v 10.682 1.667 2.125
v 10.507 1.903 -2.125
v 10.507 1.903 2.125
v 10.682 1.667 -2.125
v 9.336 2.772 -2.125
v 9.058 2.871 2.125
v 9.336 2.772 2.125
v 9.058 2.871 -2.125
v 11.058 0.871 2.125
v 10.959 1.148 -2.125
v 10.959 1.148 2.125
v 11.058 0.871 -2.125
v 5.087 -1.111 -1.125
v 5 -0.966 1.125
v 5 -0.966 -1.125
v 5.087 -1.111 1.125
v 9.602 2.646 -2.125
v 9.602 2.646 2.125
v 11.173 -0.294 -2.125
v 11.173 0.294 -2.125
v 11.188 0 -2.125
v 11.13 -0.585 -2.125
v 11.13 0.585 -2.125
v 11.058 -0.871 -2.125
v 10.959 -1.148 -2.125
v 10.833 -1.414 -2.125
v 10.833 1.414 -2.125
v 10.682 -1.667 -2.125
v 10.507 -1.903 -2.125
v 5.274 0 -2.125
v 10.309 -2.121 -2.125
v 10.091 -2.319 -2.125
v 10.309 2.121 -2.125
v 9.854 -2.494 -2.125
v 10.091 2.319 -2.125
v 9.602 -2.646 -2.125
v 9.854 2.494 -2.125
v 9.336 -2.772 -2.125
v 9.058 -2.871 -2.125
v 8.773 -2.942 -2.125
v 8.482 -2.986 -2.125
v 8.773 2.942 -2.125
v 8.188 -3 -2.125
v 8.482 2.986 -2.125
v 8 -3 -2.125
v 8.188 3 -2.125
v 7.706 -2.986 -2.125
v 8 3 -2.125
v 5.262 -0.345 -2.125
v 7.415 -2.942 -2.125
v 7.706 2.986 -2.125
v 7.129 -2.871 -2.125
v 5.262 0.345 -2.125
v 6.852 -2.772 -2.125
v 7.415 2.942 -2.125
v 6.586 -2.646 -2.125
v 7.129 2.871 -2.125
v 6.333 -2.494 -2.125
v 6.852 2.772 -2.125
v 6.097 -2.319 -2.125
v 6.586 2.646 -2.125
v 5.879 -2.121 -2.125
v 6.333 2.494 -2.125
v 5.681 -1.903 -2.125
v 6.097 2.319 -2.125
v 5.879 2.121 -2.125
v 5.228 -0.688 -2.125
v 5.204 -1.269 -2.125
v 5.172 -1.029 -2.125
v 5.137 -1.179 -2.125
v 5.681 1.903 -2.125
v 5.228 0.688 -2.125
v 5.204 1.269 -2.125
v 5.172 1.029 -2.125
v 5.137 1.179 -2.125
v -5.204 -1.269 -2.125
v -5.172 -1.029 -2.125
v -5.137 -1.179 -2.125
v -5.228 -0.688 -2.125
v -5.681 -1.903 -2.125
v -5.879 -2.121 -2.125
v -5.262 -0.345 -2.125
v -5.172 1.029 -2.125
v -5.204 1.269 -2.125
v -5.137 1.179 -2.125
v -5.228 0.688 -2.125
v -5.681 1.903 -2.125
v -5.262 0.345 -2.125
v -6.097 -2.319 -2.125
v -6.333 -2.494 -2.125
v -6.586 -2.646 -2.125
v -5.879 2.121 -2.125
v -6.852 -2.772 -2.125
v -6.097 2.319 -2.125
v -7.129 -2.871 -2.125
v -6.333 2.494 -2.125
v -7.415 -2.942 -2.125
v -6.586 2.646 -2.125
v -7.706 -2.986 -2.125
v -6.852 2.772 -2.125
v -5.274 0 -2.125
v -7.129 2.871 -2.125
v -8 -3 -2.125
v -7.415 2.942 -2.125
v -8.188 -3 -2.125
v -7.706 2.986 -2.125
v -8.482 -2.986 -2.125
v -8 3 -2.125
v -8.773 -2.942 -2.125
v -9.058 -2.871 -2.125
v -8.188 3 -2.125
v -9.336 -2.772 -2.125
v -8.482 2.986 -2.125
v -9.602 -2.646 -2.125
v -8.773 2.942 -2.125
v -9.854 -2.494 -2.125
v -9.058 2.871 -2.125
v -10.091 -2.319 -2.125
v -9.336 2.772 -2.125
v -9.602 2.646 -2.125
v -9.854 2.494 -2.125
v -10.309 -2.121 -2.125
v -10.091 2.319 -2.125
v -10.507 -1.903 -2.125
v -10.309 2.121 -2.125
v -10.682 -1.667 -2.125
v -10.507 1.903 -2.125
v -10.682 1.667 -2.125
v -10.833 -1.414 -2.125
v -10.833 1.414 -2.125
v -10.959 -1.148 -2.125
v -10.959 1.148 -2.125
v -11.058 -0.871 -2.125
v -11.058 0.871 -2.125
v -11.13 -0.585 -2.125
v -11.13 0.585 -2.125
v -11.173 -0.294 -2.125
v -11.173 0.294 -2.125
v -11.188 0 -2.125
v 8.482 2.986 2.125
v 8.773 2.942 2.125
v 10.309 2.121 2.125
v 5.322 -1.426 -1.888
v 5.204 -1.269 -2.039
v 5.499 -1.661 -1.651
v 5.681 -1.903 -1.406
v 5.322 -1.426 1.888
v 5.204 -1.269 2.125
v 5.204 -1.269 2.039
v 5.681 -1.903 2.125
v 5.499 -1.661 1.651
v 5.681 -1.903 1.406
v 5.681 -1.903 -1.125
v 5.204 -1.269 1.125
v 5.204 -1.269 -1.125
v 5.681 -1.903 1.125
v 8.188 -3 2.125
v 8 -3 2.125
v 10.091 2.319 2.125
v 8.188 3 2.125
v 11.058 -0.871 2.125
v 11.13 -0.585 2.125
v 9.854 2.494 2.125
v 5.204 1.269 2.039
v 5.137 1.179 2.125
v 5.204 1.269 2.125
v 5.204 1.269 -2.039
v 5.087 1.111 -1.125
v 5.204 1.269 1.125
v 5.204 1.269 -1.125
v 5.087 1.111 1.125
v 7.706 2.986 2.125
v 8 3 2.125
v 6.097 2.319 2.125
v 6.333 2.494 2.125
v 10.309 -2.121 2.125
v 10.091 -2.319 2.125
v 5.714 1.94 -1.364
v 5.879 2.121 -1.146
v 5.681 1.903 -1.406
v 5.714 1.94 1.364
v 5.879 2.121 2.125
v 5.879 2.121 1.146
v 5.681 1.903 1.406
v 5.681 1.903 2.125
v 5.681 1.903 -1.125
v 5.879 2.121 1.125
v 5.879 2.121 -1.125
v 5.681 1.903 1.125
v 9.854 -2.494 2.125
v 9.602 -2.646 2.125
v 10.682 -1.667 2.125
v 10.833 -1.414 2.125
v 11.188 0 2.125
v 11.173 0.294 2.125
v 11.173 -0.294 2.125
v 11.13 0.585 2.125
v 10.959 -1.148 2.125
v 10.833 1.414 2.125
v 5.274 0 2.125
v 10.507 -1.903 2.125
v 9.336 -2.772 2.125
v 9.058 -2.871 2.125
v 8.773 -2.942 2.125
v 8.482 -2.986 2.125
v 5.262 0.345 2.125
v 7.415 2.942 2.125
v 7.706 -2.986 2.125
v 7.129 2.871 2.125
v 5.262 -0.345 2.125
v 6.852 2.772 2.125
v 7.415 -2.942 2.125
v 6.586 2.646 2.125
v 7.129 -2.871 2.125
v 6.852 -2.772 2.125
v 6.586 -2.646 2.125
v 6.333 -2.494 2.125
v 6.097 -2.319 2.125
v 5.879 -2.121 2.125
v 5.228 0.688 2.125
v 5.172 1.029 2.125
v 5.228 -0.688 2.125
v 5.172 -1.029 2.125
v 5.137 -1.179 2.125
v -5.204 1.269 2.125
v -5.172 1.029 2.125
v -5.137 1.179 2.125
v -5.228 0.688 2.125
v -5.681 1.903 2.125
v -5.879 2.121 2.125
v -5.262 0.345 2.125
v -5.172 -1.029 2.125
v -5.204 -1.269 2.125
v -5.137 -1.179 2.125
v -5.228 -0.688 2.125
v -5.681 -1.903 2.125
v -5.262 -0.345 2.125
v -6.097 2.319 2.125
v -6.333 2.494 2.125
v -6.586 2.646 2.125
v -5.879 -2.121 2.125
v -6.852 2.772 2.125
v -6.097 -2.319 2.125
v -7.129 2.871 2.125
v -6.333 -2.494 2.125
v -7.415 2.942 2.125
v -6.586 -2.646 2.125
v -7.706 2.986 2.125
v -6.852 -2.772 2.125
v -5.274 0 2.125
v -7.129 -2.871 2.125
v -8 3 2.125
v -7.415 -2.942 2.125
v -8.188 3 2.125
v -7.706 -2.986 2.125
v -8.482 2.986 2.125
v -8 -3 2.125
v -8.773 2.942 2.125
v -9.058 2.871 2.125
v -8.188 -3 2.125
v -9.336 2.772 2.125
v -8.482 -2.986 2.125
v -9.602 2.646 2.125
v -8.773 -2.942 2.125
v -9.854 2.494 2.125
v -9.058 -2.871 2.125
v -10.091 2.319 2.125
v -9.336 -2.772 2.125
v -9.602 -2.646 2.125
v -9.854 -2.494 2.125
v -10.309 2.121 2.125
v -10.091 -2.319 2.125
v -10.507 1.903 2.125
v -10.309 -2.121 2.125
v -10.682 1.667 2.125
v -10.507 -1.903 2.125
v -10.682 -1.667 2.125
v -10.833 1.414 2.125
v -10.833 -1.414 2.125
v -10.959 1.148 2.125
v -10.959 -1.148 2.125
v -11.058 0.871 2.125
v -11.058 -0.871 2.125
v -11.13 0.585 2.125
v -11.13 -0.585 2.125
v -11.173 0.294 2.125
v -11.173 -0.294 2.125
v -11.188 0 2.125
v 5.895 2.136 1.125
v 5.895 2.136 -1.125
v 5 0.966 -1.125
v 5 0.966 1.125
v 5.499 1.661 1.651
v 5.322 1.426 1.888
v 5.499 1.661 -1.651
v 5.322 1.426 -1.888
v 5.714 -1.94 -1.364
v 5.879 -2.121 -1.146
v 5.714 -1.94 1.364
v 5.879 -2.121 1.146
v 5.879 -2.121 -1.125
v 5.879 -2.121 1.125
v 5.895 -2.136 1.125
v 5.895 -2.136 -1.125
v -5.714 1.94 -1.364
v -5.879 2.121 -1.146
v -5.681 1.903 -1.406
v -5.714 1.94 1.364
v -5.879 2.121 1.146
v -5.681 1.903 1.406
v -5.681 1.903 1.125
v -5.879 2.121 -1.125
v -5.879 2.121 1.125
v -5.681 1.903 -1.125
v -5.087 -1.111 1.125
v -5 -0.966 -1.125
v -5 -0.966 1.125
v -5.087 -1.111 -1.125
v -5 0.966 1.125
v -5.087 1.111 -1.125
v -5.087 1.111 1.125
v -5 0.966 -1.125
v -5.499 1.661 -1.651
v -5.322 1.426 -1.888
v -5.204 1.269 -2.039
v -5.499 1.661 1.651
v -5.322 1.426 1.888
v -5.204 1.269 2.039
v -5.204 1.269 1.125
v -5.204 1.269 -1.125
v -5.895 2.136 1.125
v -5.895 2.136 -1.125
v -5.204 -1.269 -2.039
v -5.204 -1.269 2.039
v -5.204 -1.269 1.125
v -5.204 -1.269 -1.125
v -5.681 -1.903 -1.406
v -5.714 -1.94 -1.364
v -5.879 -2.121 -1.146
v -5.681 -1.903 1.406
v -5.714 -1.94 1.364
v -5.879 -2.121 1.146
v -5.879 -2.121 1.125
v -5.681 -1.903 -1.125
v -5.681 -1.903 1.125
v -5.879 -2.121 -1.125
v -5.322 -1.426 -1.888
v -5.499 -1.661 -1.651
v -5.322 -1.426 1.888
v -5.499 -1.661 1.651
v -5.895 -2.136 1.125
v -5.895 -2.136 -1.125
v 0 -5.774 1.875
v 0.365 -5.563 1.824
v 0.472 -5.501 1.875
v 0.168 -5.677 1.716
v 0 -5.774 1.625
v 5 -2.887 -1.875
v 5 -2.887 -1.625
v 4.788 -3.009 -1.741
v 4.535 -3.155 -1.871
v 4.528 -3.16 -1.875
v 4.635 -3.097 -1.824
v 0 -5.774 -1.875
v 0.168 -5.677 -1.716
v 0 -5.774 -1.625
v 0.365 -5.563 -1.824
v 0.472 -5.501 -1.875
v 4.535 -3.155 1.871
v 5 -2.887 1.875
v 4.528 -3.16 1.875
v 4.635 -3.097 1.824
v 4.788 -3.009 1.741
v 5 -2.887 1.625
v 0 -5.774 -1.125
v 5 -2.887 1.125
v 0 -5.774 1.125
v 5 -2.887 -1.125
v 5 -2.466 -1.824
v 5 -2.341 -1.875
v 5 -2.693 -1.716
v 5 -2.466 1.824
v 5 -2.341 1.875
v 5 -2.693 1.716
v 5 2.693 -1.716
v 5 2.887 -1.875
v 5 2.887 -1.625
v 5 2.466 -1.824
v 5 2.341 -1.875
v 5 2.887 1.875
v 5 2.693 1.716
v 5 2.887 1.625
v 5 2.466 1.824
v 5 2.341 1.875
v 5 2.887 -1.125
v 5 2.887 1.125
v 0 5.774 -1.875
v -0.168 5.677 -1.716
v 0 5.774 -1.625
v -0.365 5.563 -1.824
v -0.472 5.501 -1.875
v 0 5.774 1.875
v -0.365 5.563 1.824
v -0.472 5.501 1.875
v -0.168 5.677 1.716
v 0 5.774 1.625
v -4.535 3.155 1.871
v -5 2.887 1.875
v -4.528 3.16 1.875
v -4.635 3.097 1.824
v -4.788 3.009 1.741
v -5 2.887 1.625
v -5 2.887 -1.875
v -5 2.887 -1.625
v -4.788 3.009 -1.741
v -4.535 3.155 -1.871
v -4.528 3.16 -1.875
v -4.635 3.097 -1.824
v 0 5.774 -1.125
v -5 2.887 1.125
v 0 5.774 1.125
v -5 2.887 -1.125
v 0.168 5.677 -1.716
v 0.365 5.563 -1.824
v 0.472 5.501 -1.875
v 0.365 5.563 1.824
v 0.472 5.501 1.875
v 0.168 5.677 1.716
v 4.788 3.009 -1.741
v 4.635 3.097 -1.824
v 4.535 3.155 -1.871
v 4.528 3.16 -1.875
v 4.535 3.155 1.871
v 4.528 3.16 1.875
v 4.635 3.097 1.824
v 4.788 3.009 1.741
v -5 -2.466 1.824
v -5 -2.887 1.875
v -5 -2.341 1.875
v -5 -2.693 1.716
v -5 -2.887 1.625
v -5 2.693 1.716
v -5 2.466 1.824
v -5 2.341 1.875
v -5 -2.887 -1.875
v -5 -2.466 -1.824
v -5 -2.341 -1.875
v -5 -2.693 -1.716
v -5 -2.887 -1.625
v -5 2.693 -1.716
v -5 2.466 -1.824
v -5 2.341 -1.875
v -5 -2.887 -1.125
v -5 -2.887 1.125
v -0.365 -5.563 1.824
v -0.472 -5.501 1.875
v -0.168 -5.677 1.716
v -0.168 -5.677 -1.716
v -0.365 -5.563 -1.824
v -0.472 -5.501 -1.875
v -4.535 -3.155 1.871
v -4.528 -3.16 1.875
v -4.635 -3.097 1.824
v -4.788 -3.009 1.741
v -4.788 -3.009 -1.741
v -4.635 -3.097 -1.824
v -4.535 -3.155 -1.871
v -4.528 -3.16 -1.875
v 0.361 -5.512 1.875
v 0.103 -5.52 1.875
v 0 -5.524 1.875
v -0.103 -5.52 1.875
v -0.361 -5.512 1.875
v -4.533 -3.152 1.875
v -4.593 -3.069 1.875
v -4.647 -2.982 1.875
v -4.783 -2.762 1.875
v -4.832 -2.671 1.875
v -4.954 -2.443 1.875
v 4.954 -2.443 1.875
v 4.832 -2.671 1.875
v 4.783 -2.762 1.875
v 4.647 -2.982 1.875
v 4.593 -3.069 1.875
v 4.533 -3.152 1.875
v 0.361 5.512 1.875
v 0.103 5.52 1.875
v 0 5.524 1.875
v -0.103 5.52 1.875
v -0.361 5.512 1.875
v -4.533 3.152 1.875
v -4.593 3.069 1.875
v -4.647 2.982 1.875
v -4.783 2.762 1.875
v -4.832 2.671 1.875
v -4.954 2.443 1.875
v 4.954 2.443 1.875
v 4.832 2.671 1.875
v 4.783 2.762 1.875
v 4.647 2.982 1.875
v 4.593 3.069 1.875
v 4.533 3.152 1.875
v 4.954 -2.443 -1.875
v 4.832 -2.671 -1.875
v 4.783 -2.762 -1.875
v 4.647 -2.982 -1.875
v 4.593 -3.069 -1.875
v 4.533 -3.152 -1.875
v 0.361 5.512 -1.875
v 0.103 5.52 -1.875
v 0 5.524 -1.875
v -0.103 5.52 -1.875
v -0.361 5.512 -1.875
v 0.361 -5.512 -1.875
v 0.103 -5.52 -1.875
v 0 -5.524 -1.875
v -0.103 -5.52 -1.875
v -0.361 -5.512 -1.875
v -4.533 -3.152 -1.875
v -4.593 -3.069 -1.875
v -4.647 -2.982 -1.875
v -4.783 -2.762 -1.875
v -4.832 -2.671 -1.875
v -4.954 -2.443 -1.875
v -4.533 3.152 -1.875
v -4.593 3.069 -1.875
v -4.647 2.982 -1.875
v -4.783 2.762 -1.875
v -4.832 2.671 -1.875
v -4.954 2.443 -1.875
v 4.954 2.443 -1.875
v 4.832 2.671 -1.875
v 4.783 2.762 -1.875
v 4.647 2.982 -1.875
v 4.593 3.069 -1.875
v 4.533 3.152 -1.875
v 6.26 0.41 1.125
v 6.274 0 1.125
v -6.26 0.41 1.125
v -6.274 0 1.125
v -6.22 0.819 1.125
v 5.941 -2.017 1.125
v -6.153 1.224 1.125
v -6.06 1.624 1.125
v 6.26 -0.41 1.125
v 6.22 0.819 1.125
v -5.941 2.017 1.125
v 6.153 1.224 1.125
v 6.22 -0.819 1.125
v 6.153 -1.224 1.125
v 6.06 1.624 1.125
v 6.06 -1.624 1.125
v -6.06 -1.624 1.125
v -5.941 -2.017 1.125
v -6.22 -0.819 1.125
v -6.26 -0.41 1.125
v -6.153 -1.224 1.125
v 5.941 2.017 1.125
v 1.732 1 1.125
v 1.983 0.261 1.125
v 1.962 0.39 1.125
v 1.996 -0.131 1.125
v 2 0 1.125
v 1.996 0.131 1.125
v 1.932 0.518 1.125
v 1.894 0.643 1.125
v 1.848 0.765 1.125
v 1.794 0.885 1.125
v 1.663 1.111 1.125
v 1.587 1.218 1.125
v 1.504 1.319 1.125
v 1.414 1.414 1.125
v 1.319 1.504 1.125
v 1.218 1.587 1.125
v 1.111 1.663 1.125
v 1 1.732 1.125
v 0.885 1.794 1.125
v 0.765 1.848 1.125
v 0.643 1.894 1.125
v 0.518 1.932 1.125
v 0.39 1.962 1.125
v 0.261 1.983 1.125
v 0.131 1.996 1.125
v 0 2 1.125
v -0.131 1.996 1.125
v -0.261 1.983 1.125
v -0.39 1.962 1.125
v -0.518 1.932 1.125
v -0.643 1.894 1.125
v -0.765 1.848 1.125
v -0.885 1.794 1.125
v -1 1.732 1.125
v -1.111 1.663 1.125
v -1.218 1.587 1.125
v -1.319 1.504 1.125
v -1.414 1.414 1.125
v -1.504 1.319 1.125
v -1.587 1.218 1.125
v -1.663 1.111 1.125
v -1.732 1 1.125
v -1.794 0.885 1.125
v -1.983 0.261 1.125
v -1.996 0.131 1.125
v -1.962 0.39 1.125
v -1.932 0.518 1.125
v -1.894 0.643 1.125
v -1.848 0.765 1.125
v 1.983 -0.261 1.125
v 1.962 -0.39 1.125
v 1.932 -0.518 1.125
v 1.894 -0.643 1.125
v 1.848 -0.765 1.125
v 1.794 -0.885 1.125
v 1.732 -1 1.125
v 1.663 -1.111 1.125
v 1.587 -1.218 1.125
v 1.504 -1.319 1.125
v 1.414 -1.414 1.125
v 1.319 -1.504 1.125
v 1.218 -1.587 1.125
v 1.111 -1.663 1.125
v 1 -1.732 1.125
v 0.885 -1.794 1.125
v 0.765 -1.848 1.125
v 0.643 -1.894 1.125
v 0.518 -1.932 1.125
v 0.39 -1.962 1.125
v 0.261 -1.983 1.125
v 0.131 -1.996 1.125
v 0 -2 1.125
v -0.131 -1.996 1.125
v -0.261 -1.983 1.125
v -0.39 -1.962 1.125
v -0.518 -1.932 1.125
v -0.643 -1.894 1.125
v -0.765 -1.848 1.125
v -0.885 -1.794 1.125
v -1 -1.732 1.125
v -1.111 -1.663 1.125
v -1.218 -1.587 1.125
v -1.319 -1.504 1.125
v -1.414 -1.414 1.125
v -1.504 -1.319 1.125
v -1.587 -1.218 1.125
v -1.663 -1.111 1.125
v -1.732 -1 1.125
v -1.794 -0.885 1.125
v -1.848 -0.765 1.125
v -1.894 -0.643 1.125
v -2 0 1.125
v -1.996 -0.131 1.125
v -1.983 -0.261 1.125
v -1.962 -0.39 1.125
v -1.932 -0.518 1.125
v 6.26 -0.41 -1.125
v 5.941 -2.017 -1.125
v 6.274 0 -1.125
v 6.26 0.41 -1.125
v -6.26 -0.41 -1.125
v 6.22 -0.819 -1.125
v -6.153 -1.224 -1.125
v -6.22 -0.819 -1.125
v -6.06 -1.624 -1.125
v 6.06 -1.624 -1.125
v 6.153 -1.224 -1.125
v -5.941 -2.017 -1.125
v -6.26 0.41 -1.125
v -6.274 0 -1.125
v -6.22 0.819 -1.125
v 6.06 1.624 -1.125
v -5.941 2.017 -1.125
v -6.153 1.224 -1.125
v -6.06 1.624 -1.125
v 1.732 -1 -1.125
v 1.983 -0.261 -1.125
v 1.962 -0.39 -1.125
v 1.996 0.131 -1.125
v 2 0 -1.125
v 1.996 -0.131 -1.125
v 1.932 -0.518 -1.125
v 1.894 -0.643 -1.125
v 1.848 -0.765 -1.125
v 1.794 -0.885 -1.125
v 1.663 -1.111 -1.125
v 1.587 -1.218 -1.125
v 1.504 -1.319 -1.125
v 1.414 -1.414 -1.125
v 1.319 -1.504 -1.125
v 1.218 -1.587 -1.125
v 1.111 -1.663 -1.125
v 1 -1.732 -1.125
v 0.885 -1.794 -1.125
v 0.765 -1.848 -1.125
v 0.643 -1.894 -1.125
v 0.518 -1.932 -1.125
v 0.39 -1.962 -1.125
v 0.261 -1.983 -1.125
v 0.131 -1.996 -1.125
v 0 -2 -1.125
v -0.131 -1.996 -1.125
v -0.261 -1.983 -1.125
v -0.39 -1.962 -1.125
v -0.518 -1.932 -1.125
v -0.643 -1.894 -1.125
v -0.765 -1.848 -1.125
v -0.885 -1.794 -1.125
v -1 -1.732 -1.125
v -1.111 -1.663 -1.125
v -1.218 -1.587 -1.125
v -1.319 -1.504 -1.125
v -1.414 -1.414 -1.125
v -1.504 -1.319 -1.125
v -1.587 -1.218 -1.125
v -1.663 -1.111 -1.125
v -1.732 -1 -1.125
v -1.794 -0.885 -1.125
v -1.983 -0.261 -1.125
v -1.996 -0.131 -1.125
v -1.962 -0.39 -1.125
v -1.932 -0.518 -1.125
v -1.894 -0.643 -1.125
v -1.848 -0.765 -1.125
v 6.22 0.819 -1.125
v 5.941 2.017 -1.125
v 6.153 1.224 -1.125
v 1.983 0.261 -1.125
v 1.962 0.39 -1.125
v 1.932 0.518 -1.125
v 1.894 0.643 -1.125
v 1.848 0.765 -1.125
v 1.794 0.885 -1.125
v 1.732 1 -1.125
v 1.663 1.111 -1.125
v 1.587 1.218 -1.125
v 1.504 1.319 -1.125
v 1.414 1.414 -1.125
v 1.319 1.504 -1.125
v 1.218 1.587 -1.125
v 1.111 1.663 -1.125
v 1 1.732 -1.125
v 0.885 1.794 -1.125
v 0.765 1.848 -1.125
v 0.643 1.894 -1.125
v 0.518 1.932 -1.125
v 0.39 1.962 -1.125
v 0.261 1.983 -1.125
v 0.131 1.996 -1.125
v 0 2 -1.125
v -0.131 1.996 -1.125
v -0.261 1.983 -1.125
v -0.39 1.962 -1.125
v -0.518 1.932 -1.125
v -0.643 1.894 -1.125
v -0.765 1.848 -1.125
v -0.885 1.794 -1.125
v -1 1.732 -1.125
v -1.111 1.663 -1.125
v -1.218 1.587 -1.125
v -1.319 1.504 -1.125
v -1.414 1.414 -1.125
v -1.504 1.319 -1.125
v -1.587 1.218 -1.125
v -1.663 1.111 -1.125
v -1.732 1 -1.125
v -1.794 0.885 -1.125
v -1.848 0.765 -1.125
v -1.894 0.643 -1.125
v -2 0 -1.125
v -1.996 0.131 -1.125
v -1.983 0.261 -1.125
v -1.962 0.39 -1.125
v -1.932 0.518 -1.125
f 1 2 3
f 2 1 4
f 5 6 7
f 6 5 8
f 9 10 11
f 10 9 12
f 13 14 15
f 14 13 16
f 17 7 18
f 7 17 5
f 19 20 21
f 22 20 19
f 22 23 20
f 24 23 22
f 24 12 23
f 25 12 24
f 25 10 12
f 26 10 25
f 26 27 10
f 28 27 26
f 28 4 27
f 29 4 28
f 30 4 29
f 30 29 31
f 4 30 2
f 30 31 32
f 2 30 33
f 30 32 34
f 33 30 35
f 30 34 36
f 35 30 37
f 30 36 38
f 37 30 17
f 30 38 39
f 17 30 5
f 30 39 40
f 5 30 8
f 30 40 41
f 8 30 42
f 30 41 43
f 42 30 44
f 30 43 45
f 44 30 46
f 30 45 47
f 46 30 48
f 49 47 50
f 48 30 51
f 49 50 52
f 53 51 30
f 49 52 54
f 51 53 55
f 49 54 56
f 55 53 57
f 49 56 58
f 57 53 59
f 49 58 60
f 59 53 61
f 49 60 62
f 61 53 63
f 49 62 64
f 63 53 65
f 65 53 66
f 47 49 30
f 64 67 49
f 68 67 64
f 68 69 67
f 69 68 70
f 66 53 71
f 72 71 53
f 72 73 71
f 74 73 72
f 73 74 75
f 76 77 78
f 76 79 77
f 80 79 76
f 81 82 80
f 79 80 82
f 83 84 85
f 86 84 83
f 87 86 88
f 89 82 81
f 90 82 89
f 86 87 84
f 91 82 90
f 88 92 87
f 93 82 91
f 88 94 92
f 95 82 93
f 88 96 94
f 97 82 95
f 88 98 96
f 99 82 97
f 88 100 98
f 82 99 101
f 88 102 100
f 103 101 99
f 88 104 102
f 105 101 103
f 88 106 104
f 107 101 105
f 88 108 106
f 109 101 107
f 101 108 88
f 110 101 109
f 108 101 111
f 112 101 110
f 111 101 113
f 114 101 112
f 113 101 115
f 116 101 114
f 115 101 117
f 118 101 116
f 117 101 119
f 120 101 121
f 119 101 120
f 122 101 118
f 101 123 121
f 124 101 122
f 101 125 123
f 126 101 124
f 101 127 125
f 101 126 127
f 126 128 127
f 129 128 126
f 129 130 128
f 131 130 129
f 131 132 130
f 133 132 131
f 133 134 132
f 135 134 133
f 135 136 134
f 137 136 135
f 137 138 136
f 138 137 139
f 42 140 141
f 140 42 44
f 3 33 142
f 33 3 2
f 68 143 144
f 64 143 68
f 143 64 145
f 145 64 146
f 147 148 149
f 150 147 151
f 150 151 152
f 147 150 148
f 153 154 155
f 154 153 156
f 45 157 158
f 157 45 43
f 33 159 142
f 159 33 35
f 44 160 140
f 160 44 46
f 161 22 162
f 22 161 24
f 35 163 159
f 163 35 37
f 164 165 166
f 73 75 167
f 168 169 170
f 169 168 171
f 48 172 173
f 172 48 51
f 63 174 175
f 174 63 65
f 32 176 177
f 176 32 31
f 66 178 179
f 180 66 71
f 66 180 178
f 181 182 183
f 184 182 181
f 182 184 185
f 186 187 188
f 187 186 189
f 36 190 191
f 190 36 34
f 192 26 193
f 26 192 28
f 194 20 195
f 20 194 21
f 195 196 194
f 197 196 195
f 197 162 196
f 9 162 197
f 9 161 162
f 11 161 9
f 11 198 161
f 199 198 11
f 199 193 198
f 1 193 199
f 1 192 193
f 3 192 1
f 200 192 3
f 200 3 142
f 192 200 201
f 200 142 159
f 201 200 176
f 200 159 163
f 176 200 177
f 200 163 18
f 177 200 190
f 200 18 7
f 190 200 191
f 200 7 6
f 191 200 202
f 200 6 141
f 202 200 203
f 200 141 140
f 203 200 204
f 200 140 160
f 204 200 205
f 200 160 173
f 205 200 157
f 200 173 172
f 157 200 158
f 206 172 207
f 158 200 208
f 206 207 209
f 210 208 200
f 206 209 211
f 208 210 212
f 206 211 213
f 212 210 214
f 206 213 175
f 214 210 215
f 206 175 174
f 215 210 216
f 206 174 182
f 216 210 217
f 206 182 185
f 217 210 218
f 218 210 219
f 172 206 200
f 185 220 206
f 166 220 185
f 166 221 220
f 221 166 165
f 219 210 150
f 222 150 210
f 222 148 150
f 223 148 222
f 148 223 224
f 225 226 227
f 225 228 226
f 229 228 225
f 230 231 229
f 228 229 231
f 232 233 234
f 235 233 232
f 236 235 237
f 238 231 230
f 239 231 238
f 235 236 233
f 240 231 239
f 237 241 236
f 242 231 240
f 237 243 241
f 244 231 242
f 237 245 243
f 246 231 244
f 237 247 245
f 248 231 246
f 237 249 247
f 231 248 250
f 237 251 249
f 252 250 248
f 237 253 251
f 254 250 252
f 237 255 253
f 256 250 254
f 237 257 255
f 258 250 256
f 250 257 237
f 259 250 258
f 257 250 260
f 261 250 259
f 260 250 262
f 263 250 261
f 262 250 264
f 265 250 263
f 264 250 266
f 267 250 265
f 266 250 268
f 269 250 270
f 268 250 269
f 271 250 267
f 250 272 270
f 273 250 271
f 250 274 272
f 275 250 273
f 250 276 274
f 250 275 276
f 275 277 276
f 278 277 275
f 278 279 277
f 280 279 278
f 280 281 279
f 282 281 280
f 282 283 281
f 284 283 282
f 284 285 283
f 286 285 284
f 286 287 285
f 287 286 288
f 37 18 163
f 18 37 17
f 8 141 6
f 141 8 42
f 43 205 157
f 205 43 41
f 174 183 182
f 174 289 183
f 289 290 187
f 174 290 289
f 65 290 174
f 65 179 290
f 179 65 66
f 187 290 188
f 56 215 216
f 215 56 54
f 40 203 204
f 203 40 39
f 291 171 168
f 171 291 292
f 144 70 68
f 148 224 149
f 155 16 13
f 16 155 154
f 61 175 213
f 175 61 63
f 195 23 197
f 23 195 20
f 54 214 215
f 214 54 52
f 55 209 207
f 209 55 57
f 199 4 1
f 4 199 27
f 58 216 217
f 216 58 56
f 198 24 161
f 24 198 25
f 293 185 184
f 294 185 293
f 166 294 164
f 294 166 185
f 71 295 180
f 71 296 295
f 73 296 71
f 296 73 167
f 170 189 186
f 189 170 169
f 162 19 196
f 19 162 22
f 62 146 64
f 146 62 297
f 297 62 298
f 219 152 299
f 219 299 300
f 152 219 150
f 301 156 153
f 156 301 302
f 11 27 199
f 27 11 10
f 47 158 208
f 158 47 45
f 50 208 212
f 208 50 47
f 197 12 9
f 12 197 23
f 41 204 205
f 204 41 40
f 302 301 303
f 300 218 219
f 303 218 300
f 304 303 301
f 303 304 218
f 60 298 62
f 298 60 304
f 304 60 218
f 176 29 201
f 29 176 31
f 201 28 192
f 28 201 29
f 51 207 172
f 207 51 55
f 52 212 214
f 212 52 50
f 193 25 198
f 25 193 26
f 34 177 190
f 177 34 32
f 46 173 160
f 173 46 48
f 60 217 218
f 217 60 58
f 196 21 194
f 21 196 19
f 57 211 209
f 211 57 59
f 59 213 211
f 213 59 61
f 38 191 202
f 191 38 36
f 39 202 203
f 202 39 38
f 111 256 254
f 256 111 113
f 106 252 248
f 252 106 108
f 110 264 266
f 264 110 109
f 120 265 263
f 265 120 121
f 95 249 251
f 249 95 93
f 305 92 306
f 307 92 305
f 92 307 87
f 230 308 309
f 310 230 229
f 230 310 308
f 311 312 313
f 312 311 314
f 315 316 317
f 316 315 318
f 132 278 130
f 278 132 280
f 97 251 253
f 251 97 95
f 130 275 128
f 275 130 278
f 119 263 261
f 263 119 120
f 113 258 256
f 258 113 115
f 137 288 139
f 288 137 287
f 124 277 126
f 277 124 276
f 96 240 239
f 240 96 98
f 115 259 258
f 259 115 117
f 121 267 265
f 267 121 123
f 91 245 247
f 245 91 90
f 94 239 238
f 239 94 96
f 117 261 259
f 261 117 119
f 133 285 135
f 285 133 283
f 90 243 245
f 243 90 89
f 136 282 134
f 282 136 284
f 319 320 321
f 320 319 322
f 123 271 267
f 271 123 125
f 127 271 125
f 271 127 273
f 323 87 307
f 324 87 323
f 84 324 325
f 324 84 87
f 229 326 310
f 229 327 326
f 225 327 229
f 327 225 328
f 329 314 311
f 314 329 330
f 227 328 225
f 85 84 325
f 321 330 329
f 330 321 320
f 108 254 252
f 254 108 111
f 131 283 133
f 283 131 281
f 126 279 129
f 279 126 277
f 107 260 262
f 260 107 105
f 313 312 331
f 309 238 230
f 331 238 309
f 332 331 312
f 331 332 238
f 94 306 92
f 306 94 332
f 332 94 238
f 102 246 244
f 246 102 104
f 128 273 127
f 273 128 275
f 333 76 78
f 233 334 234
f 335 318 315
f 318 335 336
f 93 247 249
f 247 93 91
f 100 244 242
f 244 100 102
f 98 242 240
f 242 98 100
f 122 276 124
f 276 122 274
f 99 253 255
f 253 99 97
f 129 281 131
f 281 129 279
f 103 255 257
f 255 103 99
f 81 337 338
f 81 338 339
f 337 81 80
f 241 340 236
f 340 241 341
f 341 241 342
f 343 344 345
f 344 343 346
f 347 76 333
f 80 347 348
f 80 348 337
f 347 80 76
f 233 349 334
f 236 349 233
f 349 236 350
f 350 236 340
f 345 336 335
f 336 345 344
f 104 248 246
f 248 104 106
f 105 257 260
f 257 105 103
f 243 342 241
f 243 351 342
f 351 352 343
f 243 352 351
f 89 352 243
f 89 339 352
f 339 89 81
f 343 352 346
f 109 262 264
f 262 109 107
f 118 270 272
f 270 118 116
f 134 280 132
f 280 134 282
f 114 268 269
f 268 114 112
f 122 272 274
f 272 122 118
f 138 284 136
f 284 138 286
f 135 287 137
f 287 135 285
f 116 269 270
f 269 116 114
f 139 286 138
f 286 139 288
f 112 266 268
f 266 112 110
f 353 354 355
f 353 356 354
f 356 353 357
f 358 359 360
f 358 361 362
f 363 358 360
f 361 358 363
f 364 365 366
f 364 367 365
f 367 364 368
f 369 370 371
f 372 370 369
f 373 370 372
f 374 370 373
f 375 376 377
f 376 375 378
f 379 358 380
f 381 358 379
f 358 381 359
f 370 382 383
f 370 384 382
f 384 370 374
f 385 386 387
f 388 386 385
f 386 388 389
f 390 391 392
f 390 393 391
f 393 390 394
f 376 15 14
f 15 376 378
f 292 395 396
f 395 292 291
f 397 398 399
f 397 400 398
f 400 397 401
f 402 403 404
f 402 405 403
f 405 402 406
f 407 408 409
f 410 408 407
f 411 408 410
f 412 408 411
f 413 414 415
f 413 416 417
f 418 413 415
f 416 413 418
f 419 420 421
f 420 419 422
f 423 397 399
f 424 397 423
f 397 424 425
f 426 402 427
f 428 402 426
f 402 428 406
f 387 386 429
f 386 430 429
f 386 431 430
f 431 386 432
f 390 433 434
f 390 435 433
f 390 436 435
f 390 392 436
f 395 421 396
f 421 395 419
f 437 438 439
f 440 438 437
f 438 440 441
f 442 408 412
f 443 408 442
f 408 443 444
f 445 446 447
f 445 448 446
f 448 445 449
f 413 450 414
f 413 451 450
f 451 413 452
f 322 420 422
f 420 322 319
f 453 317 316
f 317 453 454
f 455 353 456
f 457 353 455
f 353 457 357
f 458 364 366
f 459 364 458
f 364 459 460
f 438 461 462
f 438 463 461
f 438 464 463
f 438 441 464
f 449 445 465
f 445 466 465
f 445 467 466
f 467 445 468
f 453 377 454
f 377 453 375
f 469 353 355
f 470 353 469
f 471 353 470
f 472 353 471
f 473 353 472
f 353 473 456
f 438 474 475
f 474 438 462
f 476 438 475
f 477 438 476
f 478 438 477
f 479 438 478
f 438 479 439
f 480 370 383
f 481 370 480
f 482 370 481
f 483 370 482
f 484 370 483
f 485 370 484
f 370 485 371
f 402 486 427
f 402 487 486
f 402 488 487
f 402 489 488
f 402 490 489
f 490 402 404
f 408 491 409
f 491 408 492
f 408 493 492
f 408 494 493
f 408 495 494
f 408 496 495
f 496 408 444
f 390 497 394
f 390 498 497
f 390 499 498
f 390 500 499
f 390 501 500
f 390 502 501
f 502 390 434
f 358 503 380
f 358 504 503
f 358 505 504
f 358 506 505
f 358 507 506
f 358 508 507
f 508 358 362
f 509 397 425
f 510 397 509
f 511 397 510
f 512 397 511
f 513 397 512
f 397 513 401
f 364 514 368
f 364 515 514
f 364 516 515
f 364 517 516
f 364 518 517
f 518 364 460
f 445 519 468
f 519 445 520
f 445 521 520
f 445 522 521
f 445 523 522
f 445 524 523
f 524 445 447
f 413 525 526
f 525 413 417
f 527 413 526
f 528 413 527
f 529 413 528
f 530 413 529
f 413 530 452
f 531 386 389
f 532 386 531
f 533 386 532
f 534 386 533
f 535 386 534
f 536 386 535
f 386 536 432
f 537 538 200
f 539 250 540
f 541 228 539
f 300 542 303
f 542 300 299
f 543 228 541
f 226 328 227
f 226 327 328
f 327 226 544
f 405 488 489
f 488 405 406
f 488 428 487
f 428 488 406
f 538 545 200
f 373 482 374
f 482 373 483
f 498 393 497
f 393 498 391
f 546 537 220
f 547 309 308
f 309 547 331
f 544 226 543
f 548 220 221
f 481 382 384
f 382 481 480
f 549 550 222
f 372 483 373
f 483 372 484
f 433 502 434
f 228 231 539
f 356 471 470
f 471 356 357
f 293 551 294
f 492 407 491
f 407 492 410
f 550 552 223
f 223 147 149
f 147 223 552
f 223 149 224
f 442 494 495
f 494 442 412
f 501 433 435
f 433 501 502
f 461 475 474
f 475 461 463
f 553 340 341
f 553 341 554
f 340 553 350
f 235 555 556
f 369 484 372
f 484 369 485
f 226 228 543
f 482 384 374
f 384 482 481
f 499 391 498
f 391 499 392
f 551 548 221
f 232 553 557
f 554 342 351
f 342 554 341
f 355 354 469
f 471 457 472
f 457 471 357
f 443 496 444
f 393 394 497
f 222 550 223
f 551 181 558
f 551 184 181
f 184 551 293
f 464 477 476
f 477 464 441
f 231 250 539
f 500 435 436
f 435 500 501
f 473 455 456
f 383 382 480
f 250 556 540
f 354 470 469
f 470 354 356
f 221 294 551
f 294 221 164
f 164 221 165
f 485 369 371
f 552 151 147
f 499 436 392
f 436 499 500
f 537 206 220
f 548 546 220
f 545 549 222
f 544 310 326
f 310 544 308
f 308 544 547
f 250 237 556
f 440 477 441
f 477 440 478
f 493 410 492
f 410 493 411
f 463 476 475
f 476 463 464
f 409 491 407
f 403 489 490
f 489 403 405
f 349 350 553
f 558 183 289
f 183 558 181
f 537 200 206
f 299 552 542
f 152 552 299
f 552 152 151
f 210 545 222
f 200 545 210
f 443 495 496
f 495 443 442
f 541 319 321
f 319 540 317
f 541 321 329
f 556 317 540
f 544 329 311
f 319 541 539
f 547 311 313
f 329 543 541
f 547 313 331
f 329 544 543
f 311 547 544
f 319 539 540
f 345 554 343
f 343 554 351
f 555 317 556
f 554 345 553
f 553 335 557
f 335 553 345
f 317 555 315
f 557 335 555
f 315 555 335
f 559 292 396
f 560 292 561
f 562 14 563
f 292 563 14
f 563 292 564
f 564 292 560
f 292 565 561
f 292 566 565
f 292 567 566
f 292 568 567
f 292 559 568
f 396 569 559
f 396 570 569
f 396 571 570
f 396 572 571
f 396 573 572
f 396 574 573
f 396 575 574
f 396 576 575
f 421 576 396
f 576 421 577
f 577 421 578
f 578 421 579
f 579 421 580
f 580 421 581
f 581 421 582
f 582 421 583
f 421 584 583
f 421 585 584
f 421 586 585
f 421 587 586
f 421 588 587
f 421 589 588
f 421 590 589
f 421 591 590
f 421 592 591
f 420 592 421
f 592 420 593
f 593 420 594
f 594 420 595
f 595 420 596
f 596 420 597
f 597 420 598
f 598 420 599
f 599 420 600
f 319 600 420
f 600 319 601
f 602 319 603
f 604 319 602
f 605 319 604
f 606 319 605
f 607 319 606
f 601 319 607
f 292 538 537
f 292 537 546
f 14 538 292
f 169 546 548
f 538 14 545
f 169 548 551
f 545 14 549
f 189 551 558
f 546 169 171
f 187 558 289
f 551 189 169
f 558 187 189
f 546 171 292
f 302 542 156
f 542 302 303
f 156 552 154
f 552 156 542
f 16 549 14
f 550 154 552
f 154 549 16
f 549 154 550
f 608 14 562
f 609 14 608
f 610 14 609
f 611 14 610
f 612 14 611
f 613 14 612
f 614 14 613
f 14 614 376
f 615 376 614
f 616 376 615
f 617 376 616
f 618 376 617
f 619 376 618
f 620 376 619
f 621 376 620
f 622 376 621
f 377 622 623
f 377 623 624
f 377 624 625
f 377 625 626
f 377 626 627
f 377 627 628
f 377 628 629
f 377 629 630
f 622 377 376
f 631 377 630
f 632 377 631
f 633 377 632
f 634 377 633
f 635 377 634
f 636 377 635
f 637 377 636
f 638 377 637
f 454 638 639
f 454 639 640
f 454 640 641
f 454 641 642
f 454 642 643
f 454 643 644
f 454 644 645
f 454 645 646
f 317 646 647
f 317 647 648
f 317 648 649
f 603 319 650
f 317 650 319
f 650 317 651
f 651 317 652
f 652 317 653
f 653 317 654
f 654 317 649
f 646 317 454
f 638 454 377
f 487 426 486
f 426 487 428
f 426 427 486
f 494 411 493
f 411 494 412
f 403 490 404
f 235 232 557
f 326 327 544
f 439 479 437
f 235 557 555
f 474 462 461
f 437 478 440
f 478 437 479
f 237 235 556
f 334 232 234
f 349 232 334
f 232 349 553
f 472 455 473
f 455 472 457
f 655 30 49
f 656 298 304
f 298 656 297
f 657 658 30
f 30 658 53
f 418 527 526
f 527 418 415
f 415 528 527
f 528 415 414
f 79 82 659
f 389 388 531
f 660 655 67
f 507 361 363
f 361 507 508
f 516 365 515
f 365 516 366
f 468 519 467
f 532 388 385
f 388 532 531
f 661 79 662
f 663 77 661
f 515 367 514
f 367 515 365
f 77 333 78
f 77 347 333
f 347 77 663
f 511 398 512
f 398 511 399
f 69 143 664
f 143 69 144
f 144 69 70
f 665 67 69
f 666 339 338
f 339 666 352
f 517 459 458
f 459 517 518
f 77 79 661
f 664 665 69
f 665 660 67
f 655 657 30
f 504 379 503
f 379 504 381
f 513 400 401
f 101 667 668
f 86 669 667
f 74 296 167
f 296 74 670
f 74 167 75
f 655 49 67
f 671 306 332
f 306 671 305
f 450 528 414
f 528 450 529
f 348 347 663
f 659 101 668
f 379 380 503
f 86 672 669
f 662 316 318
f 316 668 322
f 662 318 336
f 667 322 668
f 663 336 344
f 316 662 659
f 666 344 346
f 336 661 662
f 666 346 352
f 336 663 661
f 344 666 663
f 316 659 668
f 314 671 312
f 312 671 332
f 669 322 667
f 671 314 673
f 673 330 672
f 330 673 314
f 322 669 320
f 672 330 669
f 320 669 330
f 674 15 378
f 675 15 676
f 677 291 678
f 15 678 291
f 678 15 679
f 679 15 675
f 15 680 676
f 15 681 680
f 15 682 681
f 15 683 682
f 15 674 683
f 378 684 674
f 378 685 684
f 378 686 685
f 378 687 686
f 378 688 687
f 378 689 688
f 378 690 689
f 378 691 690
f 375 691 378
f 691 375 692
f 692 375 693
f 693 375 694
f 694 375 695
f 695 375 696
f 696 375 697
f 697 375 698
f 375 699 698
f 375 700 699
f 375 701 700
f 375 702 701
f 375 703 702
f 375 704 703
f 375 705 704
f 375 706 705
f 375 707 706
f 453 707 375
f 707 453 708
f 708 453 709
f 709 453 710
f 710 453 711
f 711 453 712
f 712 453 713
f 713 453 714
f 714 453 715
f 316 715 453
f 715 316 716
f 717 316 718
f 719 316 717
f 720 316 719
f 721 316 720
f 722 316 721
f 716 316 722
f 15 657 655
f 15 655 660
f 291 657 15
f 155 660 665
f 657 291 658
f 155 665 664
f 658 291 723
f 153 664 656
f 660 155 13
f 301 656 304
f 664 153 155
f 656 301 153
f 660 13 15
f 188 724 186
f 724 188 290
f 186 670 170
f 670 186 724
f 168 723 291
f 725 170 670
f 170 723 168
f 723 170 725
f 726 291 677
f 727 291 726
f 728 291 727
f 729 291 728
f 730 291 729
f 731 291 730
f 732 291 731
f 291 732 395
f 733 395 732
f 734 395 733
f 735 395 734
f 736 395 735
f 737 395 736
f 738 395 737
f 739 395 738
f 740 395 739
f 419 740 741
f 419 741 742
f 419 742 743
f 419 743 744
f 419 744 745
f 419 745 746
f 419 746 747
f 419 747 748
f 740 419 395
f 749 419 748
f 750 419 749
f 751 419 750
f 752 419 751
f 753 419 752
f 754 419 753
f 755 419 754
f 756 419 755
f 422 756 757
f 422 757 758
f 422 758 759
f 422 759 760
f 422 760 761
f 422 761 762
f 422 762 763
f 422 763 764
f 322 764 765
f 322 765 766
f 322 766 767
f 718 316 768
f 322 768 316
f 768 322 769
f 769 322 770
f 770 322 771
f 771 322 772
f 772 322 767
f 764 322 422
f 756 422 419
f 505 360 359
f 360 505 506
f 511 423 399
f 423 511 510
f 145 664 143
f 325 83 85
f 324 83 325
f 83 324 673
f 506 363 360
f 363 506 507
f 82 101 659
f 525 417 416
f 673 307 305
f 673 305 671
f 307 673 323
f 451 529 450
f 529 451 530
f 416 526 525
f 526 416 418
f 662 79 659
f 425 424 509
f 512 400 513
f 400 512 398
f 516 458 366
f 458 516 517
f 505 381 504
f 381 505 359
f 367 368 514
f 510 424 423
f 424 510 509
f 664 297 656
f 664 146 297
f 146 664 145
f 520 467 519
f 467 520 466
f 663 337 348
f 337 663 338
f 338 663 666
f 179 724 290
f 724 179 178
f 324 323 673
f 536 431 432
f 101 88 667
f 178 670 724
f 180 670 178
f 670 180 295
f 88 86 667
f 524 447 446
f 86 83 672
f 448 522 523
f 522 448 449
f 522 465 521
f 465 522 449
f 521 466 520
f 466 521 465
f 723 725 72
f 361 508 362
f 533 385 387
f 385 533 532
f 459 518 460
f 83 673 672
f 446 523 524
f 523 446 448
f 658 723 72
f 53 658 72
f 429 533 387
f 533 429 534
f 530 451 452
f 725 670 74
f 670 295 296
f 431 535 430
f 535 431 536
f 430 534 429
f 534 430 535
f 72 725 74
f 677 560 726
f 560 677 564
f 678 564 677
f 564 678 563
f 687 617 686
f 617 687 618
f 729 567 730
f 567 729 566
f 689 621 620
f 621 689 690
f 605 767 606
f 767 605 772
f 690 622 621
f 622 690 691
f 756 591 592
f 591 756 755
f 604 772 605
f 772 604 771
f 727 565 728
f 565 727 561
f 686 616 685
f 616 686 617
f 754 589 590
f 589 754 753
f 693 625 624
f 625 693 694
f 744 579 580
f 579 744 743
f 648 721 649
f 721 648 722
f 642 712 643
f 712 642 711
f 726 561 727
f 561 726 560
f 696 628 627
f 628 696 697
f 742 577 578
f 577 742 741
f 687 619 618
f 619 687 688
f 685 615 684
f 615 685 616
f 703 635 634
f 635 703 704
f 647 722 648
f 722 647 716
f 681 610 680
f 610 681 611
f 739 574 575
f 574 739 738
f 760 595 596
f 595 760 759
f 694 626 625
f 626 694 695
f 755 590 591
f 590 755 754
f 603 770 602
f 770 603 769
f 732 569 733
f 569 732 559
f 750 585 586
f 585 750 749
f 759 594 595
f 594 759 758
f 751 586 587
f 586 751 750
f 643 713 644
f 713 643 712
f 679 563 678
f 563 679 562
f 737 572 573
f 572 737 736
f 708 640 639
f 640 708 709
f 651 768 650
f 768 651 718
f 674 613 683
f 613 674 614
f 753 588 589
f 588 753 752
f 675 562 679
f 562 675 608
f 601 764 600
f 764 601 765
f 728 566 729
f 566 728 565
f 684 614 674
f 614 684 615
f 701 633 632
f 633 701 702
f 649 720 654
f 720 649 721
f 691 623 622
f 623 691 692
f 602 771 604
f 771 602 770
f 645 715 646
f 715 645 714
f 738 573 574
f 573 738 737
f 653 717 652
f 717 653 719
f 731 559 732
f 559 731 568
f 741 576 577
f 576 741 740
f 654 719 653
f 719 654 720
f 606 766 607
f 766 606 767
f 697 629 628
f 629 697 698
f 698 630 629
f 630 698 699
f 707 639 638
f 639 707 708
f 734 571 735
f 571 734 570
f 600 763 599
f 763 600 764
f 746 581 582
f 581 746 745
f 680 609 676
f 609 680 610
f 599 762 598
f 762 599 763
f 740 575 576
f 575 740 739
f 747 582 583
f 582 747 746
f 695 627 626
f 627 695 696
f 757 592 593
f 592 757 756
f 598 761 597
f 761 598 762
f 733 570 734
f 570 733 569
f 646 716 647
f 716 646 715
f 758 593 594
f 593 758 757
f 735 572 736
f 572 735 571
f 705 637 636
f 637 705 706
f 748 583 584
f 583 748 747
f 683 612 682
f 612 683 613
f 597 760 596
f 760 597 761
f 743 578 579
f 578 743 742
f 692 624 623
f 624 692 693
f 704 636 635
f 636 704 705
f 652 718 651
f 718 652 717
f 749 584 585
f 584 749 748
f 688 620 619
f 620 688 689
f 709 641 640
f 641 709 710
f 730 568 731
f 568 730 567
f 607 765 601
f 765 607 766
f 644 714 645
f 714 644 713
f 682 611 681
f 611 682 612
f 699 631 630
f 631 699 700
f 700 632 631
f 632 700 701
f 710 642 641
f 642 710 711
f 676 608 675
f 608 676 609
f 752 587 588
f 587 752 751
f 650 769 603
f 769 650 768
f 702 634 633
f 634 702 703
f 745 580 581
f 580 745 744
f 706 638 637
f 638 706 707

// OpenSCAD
// Wing nut for 4.0mm screw, 10.0mm across flats, 3.75mm thick

$fn = 96;

// Parameters
across_flats = 10.0;          //[5.0:20.0:0.1]
thickness    = 3.75;          //[2.0:8.0:0.05]

// Hole (clearance for 4.0mm screw)
hole_d = 4.0;                 //[3.5:5.0:0.05]

// Wings (two lobes)
wing_span      = 22.0;        //[12.0:44.0:0.5]   // tip-to-tip overall span
wing_width     = 6.0;         //[3.0:12.0:0.25]   // max wing width (Y direction)
wing_thickness = 3.75;        //[1.5:6.0:0.1]     // wing thickness (Z), clamped to nut thickness
wing_tip_r     = 3.0;         //[0.8:6.0:0.1]     // rounding at wing tips
wing_root_r    = 2.0;         //[0.5:4.0:0.1]     // rounding at wing root

// Edge chamfer
edge_chamfer = 0.5;           //[0.0:1.5:0.05]

// Connectivity overlap
overlap = 0.25;               //[0.05:1.0:0.05]

// Derived
hex_R   = across_flats / sqrt(3);                 // circumradius for hex with given across-flats
wing_len = max(0, wing_span/2 - across_flats/2);  // extension beyond hex flats
wing_z  = min(wing_thickness, thickness);

// Hex prism (across flats = across_flats)
module hex_body() {
    rotate([0,0,30])
        cylinder(r=hex_R, h=thickness, center=true, $fn=6);
}

// Chamfer by subtracting two shallow cones (keeps one connected solid)
module edge_chamfer_cut() {
    if (edge_chamfer > 0) {
        // Top chamfer
        translate([0,0, thickness/2 - edge_chamfer/2])
            cylinder(h=edge_chamfer + 2*overlap,
                     r1=hex_R + edge_chamfer,
                     r2=hex_R - edge_chamfer,
                     center=true, $fn=96);
        // Bottom chamfer
        translate([0,0,-thickness/2 + edge_chamfer/2])
            cylinder(h=edge_chamfer + 2*overlap,
                     r1=hex_R - edge_chamfer,
                     r2=hex_R + edge_chamfer,
                     center=true, $fn=96);
    }
}

// One wing lobe (positive X), rounded and connected to hex
module wing_pos() {
    // Ensure the wing overlaps into the hex so it is one connected solid
    x_root = across_flats/2 - overlap;          // starts slightly inside hex flat
    x_tip  = across_flats/2 + wing_len;         // outermost tip position from center

    // Keep radii sane relative to available length
    rr = min(wing_root_r, max(0.01, (x_tip - x_root)/2));
    tr = min(wing_tip_r,  max(0.01, (x_tip - x_root)/2));

    // Wing is a lobe (not a rectangular bar): hull of two "capsules" plus a waist control
    hull() {
        // Root round (bigger) to blend into nut body
        translate([x_root + rr, 0, 0])
            cylinder(r=rr, h=wing_z + 2*overlap, center=true, $fn=64);

        // Tip round (smaller/rounded)
        translate([x_tip - tr, 0, 0])
            cylinder(r=tr, h=wing_z + 2*overlap, center=true, $fn=64);

        // Waist control to set overall wing width without making it a long rectangle
        translate([x_root + (x_tip - x_root)*0.55, 0, 0])
            cylinder(r=max(0.01, wing_width/2), h=wing_z + 2*overlap, center=true, $fn=64);
    }
}

// Both wings
module wings() {
    union() {
        wing_pos();
        mirror([1,0,0]) wing_pos();
    }
}

// Final model
difference() {
    union() {
        hex_body();
        wings();
    }

    // Chamfer cuts
    edge_chamfer_cut();

    // Through hole for 4.0mm screw (clearance)
    cylinder(d=hole_d, h=thickness + 4*overlap, center=true, $fn=96);
}
